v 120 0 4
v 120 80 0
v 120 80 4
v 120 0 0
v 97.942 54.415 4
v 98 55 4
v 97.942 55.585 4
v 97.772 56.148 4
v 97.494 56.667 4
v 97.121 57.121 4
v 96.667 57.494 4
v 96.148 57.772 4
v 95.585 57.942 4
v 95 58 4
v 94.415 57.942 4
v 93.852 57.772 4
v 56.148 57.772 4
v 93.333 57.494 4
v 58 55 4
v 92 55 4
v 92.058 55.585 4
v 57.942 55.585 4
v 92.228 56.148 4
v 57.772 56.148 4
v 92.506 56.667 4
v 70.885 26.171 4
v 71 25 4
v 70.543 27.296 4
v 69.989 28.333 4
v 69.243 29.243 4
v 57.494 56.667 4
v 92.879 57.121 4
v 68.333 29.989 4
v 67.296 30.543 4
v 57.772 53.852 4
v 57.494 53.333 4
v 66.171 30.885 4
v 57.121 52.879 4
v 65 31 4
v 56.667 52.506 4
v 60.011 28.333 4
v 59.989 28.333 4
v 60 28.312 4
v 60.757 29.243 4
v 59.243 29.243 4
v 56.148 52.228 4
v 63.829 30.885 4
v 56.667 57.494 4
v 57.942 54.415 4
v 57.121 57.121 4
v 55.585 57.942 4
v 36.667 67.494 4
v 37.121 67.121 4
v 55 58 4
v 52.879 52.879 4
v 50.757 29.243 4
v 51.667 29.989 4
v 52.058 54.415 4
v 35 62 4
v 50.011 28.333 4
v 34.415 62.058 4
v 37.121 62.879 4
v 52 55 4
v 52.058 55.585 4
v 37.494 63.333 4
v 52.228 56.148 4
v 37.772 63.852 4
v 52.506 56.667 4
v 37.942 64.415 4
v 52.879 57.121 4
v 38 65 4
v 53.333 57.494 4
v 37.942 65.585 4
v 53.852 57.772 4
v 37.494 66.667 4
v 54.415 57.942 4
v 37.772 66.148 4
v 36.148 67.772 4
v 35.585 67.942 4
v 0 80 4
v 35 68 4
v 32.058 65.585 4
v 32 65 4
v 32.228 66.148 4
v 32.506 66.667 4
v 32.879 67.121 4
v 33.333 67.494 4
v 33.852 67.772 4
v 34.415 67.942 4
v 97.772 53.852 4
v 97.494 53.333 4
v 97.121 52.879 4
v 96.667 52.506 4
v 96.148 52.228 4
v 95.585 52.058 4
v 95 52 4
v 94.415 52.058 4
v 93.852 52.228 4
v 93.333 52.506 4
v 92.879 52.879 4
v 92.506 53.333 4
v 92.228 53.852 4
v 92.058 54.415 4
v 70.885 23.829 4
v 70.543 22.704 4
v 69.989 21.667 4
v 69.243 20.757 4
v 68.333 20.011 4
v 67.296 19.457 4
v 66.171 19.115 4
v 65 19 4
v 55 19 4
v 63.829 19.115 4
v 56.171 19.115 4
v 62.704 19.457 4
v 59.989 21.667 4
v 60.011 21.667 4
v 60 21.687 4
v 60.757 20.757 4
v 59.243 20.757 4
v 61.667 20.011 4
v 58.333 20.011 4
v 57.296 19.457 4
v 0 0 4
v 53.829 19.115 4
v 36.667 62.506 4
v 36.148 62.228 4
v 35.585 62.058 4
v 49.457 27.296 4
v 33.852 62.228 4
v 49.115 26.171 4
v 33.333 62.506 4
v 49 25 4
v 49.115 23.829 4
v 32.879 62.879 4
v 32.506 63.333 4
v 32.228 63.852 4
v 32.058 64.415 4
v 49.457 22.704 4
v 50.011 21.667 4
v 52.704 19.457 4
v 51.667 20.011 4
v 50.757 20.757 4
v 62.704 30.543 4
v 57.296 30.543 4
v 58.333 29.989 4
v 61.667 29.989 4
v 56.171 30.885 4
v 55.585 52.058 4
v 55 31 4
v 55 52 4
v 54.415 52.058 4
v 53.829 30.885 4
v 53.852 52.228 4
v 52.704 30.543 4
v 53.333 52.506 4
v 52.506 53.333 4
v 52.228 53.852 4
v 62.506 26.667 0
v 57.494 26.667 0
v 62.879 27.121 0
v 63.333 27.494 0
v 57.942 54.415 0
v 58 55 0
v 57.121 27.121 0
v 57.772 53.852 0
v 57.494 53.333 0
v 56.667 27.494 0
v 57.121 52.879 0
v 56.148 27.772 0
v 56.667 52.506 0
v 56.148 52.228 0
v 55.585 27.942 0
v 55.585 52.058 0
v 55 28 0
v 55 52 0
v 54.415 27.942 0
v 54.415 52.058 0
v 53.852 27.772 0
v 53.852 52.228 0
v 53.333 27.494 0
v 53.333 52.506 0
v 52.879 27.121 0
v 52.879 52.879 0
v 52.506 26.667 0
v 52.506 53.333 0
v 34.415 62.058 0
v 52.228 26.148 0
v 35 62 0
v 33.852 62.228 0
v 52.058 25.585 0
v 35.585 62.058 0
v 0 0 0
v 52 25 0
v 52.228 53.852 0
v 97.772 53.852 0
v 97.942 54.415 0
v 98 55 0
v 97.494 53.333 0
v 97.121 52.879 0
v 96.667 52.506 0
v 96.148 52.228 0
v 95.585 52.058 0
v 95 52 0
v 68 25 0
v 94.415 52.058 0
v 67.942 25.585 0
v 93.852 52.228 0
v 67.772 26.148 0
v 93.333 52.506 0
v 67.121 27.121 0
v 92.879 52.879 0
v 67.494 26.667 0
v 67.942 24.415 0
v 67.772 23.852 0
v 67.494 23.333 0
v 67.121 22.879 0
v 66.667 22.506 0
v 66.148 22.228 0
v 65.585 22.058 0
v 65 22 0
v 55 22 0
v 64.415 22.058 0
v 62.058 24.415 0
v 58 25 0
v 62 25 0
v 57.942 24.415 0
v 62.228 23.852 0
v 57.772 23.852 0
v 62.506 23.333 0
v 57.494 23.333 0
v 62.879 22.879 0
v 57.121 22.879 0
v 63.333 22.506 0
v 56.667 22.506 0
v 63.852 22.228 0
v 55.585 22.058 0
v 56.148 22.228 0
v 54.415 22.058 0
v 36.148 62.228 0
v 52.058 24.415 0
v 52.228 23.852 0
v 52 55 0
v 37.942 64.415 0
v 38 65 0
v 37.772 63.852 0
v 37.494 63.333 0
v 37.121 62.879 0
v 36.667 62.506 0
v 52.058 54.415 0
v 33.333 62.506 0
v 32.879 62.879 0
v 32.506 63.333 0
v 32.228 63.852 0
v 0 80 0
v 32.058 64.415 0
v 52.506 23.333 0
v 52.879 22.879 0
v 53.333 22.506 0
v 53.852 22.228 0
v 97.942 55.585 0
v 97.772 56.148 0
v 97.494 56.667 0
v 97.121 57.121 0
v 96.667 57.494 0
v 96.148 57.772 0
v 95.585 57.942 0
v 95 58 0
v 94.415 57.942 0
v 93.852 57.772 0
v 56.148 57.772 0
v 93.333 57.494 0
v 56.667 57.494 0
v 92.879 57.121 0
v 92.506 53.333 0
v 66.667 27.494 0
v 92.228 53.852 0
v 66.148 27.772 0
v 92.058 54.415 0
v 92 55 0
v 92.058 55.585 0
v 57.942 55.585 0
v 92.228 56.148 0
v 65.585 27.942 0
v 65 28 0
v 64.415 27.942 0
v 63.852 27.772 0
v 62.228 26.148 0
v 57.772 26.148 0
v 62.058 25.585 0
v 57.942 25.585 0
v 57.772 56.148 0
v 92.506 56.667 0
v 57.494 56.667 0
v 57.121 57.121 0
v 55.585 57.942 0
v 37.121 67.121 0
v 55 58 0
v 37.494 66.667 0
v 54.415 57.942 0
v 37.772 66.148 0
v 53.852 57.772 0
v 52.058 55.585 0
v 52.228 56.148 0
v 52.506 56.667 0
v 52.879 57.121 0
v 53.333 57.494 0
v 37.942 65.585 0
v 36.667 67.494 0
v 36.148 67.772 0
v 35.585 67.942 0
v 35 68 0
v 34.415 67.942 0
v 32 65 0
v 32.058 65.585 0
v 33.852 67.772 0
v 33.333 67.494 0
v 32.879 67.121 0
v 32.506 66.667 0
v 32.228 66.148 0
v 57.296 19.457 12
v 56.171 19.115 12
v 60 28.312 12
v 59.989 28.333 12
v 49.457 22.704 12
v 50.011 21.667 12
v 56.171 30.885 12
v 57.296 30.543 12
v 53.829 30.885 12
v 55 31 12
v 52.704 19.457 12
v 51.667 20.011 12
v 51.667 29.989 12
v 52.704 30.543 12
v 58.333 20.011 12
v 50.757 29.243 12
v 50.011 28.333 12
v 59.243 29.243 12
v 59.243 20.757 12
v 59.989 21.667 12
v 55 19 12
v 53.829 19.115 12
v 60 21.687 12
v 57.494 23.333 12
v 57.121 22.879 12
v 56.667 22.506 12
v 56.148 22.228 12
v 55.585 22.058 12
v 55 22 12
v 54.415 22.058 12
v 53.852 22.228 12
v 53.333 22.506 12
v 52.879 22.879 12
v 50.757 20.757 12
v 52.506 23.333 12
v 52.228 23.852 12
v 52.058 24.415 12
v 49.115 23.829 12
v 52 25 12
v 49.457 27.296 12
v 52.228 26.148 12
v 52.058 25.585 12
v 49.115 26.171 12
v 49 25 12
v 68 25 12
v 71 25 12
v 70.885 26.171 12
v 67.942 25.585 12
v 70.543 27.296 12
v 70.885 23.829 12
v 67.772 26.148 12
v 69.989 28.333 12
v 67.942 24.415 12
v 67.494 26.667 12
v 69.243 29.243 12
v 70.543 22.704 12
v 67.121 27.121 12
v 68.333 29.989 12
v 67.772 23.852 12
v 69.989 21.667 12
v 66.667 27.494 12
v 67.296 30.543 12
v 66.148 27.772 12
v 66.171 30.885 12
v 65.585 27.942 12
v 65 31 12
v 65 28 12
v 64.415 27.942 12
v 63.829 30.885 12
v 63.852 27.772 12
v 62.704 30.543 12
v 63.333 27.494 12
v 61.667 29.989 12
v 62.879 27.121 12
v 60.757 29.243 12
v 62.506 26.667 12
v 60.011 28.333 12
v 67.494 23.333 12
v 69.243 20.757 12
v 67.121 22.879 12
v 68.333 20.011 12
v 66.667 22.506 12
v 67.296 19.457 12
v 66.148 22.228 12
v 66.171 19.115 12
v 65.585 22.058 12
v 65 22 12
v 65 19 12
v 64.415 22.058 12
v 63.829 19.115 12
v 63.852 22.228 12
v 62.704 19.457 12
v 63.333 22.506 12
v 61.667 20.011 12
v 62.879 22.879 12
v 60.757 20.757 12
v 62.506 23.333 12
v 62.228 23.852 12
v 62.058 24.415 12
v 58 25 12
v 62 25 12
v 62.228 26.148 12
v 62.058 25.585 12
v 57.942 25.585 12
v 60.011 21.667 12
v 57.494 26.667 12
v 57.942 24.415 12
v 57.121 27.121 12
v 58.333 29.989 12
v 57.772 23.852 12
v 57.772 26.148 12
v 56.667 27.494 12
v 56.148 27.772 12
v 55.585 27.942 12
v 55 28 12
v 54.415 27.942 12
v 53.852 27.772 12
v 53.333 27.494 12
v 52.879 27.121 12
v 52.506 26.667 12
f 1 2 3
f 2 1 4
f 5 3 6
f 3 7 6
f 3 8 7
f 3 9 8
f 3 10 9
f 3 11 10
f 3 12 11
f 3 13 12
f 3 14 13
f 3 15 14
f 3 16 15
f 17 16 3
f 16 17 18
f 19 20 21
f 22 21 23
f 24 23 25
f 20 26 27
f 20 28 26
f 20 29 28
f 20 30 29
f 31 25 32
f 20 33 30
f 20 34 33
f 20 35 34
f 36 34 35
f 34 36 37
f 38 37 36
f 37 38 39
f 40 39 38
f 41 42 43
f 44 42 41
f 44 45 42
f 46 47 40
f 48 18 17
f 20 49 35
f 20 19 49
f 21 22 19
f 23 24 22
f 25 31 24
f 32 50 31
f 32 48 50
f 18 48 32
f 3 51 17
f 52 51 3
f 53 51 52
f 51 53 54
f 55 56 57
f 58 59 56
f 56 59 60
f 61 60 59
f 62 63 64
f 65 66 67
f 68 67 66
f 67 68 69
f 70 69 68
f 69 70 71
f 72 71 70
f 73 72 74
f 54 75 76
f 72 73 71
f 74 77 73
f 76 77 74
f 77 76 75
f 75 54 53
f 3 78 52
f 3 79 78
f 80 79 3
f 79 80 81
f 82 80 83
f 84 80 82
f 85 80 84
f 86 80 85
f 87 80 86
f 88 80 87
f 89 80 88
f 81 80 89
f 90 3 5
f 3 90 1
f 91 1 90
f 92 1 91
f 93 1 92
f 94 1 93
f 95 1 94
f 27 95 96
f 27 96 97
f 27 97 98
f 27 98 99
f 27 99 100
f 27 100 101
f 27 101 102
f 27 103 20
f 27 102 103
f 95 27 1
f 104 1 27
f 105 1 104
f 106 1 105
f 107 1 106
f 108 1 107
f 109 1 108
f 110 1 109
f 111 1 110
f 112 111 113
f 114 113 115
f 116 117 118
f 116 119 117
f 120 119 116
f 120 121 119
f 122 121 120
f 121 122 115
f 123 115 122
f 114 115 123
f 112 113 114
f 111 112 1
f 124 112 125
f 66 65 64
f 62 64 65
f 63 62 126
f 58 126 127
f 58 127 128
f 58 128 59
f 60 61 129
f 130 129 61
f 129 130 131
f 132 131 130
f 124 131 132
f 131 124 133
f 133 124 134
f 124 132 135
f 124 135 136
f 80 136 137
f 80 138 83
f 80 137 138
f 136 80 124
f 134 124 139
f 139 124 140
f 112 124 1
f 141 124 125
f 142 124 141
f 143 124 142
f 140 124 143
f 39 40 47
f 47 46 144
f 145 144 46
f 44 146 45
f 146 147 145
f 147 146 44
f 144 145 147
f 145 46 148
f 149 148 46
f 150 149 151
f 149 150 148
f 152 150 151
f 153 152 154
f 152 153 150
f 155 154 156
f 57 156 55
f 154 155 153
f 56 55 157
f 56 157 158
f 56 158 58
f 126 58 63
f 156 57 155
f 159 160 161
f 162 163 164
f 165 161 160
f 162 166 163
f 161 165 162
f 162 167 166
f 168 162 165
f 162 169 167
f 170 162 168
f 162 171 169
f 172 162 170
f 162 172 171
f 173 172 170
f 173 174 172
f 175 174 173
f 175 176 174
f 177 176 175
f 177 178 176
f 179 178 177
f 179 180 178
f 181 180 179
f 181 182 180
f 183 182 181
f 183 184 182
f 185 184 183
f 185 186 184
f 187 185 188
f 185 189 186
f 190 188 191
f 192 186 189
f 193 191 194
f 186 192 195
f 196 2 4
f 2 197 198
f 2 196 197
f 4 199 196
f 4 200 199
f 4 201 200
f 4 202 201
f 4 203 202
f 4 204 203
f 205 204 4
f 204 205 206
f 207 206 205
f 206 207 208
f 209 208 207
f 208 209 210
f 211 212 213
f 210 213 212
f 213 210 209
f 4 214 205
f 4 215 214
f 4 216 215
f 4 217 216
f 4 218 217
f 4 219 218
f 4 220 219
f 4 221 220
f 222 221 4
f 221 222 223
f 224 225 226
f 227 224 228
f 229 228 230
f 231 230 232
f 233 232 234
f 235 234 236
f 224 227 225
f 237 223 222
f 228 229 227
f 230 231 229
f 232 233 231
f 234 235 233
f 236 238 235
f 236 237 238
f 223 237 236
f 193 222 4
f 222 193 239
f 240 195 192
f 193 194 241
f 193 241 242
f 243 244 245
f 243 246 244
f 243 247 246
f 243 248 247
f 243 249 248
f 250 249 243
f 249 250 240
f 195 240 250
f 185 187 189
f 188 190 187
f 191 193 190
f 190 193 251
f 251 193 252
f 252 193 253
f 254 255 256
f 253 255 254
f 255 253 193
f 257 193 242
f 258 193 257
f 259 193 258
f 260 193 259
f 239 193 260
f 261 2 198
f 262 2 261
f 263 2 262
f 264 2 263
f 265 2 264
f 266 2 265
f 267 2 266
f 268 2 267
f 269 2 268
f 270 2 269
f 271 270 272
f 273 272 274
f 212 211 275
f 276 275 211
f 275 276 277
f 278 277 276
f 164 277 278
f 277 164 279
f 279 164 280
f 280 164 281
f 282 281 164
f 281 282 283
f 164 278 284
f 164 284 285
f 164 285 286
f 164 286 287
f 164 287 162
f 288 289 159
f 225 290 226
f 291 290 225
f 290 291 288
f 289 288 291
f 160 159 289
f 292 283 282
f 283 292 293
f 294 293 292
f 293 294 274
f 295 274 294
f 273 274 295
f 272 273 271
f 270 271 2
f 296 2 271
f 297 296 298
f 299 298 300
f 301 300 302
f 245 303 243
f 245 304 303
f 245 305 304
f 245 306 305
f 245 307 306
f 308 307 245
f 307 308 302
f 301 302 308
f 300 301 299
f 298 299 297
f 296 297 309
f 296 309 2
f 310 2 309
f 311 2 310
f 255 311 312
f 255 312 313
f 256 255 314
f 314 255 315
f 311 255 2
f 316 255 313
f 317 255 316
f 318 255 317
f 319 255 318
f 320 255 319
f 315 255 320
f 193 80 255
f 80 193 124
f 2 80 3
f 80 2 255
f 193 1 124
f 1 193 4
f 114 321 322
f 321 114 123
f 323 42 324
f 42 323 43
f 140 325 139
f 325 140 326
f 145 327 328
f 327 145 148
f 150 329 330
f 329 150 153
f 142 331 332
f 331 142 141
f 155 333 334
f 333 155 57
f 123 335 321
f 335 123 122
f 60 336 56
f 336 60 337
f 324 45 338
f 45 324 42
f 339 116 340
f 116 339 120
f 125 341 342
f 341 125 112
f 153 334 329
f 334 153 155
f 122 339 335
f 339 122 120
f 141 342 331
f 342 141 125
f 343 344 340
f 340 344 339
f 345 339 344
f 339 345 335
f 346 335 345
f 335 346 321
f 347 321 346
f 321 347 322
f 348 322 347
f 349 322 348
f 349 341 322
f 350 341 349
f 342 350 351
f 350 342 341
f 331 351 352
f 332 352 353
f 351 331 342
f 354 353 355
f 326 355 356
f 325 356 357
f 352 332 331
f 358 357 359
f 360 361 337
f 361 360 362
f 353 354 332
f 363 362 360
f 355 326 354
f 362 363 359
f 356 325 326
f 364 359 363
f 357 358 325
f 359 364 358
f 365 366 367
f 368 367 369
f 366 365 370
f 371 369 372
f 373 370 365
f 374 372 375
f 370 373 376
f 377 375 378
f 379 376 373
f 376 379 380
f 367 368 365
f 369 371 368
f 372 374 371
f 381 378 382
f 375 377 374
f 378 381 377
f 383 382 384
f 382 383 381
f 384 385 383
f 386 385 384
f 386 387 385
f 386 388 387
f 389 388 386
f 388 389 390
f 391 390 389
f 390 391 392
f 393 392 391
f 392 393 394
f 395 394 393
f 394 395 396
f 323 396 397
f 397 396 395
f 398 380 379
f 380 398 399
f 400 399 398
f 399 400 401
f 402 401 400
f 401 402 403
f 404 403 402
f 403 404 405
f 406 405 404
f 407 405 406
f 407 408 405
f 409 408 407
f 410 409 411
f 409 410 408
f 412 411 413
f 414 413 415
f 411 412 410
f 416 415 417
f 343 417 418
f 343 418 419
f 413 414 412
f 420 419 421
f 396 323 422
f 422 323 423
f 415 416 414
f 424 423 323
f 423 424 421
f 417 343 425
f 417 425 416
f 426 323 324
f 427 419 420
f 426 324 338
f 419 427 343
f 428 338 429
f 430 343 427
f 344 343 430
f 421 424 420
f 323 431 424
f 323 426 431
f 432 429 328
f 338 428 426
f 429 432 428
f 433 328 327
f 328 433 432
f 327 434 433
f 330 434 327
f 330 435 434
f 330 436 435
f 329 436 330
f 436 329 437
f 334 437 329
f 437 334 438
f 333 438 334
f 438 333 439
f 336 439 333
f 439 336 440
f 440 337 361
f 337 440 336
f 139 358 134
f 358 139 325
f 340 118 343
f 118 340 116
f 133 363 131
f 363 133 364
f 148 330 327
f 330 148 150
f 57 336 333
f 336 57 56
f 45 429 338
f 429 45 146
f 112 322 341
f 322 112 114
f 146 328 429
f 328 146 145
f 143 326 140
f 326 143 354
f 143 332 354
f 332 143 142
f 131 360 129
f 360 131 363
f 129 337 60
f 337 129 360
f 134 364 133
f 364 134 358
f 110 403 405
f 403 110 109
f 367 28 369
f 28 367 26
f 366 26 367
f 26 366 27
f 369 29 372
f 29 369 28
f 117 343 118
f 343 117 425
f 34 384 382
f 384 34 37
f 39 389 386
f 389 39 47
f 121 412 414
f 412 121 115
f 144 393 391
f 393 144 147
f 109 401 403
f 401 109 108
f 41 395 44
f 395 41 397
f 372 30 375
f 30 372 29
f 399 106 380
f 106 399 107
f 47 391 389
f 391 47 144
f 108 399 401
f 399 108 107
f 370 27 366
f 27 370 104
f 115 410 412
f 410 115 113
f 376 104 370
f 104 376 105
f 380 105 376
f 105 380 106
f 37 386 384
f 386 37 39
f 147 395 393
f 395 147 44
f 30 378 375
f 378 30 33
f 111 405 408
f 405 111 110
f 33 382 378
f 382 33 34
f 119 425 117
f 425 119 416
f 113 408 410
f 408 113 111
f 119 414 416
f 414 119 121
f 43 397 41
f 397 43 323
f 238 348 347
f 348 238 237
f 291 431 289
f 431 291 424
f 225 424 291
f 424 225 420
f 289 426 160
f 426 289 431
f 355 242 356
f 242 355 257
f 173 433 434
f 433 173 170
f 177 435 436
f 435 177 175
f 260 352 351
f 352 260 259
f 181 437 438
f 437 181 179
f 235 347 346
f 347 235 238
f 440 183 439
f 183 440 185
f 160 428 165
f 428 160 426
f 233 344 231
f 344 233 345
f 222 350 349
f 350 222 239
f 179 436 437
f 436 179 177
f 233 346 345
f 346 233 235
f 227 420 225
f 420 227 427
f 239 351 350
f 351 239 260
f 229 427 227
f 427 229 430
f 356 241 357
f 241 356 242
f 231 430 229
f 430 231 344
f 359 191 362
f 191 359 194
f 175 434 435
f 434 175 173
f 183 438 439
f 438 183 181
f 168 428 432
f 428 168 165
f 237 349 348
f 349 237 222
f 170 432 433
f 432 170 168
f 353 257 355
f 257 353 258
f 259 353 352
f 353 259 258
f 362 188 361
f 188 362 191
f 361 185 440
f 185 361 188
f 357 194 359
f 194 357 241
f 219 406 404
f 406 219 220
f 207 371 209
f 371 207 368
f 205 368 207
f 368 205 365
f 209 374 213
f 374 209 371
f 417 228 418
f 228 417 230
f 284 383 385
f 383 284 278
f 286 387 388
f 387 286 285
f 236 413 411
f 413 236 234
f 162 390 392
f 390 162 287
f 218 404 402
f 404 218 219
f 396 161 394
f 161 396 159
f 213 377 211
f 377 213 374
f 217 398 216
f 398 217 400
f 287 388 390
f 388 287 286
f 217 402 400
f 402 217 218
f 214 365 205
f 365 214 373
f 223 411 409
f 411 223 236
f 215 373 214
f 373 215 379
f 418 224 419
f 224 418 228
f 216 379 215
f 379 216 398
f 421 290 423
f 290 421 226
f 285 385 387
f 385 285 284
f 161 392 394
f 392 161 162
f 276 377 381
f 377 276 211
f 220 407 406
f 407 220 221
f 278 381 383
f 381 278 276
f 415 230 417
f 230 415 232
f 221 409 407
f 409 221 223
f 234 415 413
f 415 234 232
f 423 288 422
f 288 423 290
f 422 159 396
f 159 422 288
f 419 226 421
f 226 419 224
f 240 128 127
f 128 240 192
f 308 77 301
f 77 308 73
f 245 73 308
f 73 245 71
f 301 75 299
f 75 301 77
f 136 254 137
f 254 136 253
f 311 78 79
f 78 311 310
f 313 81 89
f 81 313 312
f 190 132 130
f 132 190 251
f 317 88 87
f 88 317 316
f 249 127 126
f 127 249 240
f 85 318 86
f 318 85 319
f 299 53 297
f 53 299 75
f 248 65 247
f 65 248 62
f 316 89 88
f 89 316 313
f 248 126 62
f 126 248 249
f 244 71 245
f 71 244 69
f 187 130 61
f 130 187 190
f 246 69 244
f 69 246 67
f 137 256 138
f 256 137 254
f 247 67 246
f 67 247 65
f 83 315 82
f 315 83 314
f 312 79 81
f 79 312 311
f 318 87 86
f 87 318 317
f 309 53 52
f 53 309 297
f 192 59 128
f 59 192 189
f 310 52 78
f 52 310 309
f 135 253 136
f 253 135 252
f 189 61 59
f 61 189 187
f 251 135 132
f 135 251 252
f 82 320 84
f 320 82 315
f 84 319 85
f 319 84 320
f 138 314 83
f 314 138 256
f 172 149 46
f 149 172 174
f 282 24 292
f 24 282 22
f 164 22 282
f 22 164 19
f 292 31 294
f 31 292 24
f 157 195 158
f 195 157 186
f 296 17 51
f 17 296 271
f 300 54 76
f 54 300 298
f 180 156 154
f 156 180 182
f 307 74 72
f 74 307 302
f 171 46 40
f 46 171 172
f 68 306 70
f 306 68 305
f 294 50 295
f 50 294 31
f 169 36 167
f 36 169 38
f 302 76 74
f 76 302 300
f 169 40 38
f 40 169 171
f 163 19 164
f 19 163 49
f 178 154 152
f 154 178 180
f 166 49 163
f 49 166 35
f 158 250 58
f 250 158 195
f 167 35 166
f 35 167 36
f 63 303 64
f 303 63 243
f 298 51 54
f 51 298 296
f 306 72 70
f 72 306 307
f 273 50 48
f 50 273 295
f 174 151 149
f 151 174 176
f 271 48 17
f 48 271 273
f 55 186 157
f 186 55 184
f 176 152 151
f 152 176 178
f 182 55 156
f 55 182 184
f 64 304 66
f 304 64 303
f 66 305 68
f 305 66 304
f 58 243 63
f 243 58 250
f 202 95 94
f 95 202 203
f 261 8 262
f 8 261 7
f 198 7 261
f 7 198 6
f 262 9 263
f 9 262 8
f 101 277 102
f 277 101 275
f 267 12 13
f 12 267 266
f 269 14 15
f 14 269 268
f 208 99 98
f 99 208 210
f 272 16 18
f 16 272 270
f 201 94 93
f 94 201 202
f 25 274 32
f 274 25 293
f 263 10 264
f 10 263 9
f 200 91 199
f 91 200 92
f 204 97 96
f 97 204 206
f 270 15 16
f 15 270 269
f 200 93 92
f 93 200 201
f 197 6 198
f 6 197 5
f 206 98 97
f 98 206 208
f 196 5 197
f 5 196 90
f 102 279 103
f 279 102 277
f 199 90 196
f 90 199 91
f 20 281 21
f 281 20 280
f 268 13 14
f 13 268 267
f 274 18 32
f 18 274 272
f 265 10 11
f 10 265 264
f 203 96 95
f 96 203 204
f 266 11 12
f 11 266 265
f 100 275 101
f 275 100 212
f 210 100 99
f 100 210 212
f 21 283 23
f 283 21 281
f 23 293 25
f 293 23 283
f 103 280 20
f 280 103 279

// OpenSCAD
$fn = 32;

// ----------------------------------------------------------------------
// Mixed field: bosses and holes at given coordinates
// ----------------------------------------------------------------------

// --- parameters (mm) ---
plate_l = 120;            // plate length, X
plate_w = 80;             // plate width, Y
plate_t = 4;              // plate thickness, Z
boss_d = 12;              // boss diameter
boss_h = 8;               // boss height above the plate
hole_d = 6;               // through hole diameter

total_h = plate_t + boss_h;  // overall height

difference() {
  union() {
    cube([plate_l, plate_w, plate_t]);
    translate([55, 25, plate_t]) cylinder(h = boss_h, d = boss_d);
    translate([65, 25, plate_t]) cylinder(h = boss_h, d = boss_d);
  }
  translate([55, 25, -1]) cylinder(h = total_h + 2, d = boss_d / 2);
  translate([65, 25, -1]) cylinder(h = total_h + 2, d = boss_d / 2);
  translate([35, 65, -1]) cylinder(h = plate_t + 2, d = hole_d);
  translate([55, 55, -1]) cylinder(h = plate_t + 2, d = hole_d);
  translate([95, 55, -1]) cylinder(h = plate_t + 2, d = hole_d);
}
